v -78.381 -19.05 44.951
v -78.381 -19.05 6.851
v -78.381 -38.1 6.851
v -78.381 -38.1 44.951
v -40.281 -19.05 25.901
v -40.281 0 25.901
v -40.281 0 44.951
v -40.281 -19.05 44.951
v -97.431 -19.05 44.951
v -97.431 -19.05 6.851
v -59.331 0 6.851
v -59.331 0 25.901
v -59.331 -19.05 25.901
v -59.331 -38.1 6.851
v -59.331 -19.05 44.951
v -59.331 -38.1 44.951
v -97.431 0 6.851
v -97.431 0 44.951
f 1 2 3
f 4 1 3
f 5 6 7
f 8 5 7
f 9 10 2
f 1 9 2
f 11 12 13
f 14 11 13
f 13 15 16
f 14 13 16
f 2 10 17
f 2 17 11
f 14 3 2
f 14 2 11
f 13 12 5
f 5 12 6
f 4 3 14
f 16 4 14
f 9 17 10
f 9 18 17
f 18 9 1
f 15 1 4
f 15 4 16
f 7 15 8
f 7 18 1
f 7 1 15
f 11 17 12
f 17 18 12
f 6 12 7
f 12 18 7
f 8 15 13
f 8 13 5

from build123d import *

# Parameters (mm, degrees)
F0_W     = 57.15
F0_H     = 19.05
F1_DEPTH = 19.05
F3_DEPTH = 19.05
F4_W     = 38.1
F4_H     = 19.05
F5_DEPTH = 19.05
F6_W     = 19.05
F6_H     = 19.05
F7_DEPTH = 19.05


with BuildPart() as f1:
    # F0 (on Front) → F1 (new body)
    with BuildSketch(Plane.XZ):
        with Locations((-68.856497, 35.426075)):
            Rectangle(F0_W, F0_H)
    extrude(amount=F1_DEPTH)

    # F2 (on face) → F3 (join)
    with BuildSketch(Plane.XZ.offset(19.05)):
        Polygon((-59.331497, 44.951075), (-78.381497, 44.951075), (-78.381497, 25.901075), (-59.331497, 25.901075), (-59.331497, 35.426075), align=None)
    extrude(amount=F3_DEPTH)

    # F4 (on face) → F5 (join)
    with BuildSketch(Plane(origin=(0, 0, 25.901075), x_dir=(1, 0, 0), z_dir=(0, 0, -1))):
        with Locations((-78.381497, 9.525)):
            Rectangle(F4_W, F4_H)
    extrude(amount=F5_DEPTH)

    # F6 (on face) → F7 (join)
    with BuildSketch(Plane(origin=(0, 0, 25.901075), x_dir=(1, 0, 0), z_dir=(0, 0, -1))):
        with Locations((-68.856497, 28.575)):
            Rectangle(F6_W, F6_H)
    extrude(amount=F7_DEPTH)


solid = f1.part
